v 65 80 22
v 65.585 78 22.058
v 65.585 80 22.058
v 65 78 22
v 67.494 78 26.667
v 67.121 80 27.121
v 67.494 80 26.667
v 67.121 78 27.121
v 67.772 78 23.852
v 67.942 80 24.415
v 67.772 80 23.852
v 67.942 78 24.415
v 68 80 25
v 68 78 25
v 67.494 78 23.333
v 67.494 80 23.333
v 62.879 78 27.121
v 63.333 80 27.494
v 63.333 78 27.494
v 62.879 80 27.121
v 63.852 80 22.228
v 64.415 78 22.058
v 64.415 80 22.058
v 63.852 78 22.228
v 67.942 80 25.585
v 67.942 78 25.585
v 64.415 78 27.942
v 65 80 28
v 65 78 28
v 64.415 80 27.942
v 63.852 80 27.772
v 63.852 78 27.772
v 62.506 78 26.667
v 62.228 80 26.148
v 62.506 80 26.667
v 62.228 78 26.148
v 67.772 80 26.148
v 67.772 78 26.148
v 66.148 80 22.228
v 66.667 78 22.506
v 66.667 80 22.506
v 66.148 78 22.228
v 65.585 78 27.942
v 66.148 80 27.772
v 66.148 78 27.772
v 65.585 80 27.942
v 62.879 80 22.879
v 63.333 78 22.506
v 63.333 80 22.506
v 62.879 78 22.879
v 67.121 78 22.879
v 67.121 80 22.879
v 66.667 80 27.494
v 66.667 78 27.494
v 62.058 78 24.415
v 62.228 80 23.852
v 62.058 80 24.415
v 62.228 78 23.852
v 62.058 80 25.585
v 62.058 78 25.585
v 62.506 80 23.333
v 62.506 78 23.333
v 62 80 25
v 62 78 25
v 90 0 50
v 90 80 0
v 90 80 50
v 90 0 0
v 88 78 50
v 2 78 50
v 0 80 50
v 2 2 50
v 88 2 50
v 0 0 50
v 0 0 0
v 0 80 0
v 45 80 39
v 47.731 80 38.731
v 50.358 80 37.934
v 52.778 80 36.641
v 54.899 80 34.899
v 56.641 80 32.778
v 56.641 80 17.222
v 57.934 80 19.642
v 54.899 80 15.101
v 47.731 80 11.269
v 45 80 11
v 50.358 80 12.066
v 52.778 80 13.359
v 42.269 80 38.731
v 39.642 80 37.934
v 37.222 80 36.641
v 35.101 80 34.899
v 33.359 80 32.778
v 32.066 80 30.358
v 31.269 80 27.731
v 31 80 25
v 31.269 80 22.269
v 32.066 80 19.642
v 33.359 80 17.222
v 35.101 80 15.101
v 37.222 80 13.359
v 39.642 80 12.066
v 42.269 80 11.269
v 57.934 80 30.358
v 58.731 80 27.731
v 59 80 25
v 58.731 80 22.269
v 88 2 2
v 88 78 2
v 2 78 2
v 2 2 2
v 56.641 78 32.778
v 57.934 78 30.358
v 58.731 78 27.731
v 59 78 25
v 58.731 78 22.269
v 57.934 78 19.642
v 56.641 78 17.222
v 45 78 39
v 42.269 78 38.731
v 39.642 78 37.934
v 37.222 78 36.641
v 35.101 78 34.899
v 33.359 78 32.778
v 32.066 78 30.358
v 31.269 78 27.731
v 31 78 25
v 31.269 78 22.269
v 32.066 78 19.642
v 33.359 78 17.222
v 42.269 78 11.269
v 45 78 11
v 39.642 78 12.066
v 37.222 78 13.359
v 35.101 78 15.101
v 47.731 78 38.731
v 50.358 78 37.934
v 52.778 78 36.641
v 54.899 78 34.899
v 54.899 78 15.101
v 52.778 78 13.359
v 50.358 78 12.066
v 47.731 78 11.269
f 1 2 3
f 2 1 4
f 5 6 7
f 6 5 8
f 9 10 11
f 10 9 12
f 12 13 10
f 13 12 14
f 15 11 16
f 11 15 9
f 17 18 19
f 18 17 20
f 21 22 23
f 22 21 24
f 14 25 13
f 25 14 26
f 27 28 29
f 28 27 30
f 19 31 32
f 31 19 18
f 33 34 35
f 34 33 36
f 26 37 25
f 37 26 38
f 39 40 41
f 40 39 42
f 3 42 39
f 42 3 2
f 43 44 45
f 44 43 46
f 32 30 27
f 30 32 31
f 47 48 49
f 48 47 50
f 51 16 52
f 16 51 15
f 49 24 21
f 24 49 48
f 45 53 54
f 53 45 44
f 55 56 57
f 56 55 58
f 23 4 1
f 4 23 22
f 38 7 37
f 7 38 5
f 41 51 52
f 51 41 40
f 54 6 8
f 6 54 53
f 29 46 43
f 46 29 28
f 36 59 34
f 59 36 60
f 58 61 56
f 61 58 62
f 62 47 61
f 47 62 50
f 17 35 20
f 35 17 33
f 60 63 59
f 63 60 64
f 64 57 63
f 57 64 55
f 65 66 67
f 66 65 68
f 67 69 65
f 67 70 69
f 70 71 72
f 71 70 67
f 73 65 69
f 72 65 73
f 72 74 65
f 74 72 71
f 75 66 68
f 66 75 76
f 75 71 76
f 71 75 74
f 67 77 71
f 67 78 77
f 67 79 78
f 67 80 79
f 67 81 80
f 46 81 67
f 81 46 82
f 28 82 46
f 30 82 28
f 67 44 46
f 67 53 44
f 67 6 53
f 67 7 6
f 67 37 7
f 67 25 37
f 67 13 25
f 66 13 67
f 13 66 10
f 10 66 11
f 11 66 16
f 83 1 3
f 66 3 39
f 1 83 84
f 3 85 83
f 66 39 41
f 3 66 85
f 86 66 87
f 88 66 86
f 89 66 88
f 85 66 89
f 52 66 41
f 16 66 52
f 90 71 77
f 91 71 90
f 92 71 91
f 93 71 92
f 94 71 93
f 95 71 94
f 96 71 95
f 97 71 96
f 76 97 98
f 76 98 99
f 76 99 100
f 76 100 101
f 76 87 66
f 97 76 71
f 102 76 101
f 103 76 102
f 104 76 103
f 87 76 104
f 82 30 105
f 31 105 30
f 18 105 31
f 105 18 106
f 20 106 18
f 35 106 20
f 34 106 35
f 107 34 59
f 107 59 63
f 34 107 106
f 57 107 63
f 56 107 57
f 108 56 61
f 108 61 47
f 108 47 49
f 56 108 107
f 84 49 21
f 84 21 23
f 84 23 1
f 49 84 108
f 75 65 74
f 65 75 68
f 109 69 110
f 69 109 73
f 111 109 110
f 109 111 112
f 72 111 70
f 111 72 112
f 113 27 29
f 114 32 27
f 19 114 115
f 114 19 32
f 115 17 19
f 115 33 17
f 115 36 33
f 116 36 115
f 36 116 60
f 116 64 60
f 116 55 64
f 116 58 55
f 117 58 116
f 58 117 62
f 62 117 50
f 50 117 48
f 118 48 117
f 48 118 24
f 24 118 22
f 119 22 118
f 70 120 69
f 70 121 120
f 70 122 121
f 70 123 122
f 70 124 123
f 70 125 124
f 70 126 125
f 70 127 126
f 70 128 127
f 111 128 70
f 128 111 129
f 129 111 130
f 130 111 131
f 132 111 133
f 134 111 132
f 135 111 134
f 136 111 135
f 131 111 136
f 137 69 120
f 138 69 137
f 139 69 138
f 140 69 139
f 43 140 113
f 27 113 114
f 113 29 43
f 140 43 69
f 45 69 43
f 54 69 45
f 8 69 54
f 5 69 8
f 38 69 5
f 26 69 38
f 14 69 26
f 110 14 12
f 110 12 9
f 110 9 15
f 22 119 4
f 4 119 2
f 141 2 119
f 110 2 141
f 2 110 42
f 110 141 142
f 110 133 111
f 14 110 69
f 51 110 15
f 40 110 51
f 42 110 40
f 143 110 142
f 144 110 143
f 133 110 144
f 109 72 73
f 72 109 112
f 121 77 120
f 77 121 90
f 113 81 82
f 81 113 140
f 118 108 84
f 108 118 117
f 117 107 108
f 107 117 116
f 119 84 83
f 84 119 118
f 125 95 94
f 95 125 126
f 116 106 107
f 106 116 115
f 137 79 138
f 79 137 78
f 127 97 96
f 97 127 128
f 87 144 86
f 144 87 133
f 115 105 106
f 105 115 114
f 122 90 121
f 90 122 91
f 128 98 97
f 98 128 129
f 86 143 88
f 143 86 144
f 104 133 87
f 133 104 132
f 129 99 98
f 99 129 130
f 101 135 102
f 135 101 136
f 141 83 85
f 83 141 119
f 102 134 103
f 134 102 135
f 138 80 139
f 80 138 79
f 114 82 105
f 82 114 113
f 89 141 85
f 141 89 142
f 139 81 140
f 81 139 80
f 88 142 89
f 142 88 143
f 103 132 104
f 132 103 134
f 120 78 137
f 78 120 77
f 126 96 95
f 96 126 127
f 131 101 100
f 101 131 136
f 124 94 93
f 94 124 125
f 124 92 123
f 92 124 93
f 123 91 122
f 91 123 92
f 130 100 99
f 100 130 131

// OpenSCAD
$fn = 32;

// ----------------------------------------------------------------------
// Vent box: roundvent enclosure
// ----------------------------------------------------------------------

// --- parameters (mm) ---
box_l = 90;               // box length, X
box_w = 80;               // box width, Y
box_h = 50;               // box height, Z
wall_t = 2;               // shell wall thickness
vent_d = 28;              // central vent diameter
ring_d = 6;               // ring hole diameter
n_ring = 6;               // holes in the ring
ring_r = 20;              // ring radius

ring_step = 360 / n_ring;  // ring hole angular step

difference() {
  cube([box_l, box_w, box_h]);
  translate([wall_t, wall_t, wall_t])
    cube([box_l - 2 * wall_t, box_w - 2 * wall_t, box_h]);
  translate([box_l / 2, box_w - wall_t - 1, box_h / 2])
    rotate([-90, 0, 0]) cylinder(h = wall_t + 2, d = vent_d);
  for (i = [0 : n_ring - 1])
    translate([box_l / 2, box_w - wall_t - 1, box_h / 2])
      rotate([0, 0, i * ring_step])
        translate([ring_r, 0, 0]) rotate([-90, 0, 0])
          cylinder(h = wall_t + 2, d = ring_d);
}
